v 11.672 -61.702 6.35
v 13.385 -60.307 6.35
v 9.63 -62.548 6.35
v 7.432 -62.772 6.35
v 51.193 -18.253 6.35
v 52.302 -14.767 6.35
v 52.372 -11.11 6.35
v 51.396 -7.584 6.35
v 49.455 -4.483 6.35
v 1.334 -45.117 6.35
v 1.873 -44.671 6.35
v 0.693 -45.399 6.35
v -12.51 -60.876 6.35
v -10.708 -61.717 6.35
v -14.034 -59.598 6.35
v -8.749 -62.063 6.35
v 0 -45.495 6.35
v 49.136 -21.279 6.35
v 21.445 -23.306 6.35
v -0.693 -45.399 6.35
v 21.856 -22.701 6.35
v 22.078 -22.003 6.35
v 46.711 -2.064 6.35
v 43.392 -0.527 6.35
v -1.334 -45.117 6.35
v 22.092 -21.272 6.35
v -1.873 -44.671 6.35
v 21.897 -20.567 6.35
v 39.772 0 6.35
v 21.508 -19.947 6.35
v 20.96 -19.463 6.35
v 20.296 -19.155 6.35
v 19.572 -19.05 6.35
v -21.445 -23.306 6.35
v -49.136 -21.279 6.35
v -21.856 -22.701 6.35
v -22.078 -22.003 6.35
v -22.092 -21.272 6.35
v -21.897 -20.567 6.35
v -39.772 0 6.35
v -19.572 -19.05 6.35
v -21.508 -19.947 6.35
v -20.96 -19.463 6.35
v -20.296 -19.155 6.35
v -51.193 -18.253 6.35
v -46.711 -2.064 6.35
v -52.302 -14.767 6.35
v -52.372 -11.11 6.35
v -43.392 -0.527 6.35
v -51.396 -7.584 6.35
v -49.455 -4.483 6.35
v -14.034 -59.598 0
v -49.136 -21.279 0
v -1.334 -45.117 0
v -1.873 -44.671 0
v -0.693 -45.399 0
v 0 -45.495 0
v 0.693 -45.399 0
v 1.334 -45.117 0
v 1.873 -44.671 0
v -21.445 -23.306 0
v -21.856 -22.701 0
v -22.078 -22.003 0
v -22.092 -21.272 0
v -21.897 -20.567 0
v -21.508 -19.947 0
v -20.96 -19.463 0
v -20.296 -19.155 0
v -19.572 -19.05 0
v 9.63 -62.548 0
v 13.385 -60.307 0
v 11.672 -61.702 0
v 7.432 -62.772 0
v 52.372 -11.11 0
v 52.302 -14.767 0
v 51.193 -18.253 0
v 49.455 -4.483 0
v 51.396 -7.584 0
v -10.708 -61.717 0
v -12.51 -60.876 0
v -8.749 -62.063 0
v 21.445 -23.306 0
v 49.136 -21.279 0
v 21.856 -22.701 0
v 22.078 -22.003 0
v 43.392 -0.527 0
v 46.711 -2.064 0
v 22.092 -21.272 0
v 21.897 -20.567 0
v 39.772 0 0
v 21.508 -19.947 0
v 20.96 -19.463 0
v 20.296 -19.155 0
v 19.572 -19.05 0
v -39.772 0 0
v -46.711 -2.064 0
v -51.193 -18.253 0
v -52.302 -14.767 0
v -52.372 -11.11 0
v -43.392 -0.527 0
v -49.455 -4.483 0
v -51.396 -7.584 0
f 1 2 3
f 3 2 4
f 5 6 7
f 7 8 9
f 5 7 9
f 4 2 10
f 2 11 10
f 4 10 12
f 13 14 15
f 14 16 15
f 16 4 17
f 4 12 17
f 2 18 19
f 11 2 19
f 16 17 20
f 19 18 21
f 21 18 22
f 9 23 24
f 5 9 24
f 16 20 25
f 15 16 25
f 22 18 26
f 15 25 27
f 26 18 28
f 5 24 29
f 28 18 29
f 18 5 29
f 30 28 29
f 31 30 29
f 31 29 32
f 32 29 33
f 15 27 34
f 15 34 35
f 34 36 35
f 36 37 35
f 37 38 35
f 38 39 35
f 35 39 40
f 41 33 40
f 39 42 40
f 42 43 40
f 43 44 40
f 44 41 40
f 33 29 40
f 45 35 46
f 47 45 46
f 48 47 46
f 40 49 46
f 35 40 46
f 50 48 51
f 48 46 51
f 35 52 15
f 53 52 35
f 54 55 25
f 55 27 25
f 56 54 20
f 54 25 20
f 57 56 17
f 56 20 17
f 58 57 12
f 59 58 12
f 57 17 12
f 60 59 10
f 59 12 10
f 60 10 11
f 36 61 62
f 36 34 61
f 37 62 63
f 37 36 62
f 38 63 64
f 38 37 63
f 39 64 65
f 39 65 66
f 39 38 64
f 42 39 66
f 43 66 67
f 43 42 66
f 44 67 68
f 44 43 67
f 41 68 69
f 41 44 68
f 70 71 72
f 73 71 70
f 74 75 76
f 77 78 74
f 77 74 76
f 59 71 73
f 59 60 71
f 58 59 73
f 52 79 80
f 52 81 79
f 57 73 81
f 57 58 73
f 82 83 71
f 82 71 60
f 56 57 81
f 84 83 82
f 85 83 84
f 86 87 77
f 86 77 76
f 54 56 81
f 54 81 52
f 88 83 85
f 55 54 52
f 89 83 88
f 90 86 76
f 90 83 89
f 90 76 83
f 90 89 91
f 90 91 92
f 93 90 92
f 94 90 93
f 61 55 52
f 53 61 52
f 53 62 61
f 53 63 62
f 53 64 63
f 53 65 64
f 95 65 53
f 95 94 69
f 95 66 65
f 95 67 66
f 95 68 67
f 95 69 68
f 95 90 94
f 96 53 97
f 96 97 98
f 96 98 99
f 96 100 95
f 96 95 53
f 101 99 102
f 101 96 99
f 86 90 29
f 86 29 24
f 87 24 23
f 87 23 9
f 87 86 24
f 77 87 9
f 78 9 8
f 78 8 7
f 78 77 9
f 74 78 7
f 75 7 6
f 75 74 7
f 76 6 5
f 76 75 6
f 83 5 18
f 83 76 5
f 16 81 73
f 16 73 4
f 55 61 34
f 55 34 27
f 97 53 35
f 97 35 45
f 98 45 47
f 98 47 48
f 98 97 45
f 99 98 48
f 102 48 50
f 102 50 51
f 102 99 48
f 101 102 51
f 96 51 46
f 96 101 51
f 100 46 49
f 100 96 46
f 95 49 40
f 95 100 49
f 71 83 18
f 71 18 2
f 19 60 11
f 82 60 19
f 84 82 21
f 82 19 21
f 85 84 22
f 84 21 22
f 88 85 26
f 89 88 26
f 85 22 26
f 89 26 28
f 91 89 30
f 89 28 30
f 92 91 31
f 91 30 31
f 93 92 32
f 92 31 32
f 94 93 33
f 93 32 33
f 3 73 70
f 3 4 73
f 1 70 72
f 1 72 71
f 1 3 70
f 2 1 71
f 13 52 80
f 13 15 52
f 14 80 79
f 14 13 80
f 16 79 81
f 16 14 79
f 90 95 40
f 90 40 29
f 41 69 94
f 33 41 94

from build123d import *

# Parameters (mm, degrees)
BOSS_EXTRUDE2_DEPTH = 6.35
CHAMFER1_SIZE       = 17.62
CHAMFER1_SIZE2      = 16.260294621
FILLET1_R           = 2.54
FILLET2_R           = 7.62


with BuildPart() as part:
    # Sketch1 → Boss-Extrude2 (new body)
    with BuildSketch(Plane.XY):
        with BuildLine():
            Line((0, -74.917600754), (-49.136391394, -21.278600827))
            ThreePointArc((-49.136391394, -21.278600827), (-51.395766113, -7.584251301), (-39.7716913, 0))
            Line((-39.7716913, 0), (0, 0))
            Line((0, 0), (39.7716913, 0))
            ThreePointArc((39.7716913, 0), (51.395766113, -7.584251301), (49.136391394, -21.278600827))
            Line((49.136391394, -21.278600827), (0, -74.917600754))
        make_face()
        Polygon((0, -46.715449274), (25.343133643, -19.05), (0, -19.05), (-25.343133643, -19.05), align=None, mode=Mode.SUBTRACT)
    extrude(amount=BOSS_EXTRUDE2_DEPTH)

    # Chamfer1
    chamfer1_edges = [part.edges().sort_by_distance(p)[0] for p in [
        (0, -74.917600754, 3.175),
    ]]
    chamfer1_side = [part.faces().sort_by_distance(p)[0] for p in [
        (-24.568195697, -48.098100791, 3.175),
    ]]
    chamfer(chamfer1_edges, length=CHAMFER1_SIZE, length2=CHAMFER1_SIZE2, reference=chamfer1_side[0])

    # Fillet1
    fillet1_edges = [part.edges().sort_by_distance(p)[0] for p in [
        (-25.343133643, -19.05, 3.175),
        (0, -46.715449274, 3.175),
        (25.343133643, -19.05, 3.175),
    ]]
    fillet(fillet1_edges, radius=FILLET1_R)

    # Fillet2
    fillet2_edges = [part.edges().sort_by_distance(p)[0] for p in [
        (10.98350999, -62.927617875, 3.175),
        (-11.901964297, -61.925001096, 3.175),
    ]]
    fillet(fillet2_edges, radius=FILLET2_R)


solid = part.part
